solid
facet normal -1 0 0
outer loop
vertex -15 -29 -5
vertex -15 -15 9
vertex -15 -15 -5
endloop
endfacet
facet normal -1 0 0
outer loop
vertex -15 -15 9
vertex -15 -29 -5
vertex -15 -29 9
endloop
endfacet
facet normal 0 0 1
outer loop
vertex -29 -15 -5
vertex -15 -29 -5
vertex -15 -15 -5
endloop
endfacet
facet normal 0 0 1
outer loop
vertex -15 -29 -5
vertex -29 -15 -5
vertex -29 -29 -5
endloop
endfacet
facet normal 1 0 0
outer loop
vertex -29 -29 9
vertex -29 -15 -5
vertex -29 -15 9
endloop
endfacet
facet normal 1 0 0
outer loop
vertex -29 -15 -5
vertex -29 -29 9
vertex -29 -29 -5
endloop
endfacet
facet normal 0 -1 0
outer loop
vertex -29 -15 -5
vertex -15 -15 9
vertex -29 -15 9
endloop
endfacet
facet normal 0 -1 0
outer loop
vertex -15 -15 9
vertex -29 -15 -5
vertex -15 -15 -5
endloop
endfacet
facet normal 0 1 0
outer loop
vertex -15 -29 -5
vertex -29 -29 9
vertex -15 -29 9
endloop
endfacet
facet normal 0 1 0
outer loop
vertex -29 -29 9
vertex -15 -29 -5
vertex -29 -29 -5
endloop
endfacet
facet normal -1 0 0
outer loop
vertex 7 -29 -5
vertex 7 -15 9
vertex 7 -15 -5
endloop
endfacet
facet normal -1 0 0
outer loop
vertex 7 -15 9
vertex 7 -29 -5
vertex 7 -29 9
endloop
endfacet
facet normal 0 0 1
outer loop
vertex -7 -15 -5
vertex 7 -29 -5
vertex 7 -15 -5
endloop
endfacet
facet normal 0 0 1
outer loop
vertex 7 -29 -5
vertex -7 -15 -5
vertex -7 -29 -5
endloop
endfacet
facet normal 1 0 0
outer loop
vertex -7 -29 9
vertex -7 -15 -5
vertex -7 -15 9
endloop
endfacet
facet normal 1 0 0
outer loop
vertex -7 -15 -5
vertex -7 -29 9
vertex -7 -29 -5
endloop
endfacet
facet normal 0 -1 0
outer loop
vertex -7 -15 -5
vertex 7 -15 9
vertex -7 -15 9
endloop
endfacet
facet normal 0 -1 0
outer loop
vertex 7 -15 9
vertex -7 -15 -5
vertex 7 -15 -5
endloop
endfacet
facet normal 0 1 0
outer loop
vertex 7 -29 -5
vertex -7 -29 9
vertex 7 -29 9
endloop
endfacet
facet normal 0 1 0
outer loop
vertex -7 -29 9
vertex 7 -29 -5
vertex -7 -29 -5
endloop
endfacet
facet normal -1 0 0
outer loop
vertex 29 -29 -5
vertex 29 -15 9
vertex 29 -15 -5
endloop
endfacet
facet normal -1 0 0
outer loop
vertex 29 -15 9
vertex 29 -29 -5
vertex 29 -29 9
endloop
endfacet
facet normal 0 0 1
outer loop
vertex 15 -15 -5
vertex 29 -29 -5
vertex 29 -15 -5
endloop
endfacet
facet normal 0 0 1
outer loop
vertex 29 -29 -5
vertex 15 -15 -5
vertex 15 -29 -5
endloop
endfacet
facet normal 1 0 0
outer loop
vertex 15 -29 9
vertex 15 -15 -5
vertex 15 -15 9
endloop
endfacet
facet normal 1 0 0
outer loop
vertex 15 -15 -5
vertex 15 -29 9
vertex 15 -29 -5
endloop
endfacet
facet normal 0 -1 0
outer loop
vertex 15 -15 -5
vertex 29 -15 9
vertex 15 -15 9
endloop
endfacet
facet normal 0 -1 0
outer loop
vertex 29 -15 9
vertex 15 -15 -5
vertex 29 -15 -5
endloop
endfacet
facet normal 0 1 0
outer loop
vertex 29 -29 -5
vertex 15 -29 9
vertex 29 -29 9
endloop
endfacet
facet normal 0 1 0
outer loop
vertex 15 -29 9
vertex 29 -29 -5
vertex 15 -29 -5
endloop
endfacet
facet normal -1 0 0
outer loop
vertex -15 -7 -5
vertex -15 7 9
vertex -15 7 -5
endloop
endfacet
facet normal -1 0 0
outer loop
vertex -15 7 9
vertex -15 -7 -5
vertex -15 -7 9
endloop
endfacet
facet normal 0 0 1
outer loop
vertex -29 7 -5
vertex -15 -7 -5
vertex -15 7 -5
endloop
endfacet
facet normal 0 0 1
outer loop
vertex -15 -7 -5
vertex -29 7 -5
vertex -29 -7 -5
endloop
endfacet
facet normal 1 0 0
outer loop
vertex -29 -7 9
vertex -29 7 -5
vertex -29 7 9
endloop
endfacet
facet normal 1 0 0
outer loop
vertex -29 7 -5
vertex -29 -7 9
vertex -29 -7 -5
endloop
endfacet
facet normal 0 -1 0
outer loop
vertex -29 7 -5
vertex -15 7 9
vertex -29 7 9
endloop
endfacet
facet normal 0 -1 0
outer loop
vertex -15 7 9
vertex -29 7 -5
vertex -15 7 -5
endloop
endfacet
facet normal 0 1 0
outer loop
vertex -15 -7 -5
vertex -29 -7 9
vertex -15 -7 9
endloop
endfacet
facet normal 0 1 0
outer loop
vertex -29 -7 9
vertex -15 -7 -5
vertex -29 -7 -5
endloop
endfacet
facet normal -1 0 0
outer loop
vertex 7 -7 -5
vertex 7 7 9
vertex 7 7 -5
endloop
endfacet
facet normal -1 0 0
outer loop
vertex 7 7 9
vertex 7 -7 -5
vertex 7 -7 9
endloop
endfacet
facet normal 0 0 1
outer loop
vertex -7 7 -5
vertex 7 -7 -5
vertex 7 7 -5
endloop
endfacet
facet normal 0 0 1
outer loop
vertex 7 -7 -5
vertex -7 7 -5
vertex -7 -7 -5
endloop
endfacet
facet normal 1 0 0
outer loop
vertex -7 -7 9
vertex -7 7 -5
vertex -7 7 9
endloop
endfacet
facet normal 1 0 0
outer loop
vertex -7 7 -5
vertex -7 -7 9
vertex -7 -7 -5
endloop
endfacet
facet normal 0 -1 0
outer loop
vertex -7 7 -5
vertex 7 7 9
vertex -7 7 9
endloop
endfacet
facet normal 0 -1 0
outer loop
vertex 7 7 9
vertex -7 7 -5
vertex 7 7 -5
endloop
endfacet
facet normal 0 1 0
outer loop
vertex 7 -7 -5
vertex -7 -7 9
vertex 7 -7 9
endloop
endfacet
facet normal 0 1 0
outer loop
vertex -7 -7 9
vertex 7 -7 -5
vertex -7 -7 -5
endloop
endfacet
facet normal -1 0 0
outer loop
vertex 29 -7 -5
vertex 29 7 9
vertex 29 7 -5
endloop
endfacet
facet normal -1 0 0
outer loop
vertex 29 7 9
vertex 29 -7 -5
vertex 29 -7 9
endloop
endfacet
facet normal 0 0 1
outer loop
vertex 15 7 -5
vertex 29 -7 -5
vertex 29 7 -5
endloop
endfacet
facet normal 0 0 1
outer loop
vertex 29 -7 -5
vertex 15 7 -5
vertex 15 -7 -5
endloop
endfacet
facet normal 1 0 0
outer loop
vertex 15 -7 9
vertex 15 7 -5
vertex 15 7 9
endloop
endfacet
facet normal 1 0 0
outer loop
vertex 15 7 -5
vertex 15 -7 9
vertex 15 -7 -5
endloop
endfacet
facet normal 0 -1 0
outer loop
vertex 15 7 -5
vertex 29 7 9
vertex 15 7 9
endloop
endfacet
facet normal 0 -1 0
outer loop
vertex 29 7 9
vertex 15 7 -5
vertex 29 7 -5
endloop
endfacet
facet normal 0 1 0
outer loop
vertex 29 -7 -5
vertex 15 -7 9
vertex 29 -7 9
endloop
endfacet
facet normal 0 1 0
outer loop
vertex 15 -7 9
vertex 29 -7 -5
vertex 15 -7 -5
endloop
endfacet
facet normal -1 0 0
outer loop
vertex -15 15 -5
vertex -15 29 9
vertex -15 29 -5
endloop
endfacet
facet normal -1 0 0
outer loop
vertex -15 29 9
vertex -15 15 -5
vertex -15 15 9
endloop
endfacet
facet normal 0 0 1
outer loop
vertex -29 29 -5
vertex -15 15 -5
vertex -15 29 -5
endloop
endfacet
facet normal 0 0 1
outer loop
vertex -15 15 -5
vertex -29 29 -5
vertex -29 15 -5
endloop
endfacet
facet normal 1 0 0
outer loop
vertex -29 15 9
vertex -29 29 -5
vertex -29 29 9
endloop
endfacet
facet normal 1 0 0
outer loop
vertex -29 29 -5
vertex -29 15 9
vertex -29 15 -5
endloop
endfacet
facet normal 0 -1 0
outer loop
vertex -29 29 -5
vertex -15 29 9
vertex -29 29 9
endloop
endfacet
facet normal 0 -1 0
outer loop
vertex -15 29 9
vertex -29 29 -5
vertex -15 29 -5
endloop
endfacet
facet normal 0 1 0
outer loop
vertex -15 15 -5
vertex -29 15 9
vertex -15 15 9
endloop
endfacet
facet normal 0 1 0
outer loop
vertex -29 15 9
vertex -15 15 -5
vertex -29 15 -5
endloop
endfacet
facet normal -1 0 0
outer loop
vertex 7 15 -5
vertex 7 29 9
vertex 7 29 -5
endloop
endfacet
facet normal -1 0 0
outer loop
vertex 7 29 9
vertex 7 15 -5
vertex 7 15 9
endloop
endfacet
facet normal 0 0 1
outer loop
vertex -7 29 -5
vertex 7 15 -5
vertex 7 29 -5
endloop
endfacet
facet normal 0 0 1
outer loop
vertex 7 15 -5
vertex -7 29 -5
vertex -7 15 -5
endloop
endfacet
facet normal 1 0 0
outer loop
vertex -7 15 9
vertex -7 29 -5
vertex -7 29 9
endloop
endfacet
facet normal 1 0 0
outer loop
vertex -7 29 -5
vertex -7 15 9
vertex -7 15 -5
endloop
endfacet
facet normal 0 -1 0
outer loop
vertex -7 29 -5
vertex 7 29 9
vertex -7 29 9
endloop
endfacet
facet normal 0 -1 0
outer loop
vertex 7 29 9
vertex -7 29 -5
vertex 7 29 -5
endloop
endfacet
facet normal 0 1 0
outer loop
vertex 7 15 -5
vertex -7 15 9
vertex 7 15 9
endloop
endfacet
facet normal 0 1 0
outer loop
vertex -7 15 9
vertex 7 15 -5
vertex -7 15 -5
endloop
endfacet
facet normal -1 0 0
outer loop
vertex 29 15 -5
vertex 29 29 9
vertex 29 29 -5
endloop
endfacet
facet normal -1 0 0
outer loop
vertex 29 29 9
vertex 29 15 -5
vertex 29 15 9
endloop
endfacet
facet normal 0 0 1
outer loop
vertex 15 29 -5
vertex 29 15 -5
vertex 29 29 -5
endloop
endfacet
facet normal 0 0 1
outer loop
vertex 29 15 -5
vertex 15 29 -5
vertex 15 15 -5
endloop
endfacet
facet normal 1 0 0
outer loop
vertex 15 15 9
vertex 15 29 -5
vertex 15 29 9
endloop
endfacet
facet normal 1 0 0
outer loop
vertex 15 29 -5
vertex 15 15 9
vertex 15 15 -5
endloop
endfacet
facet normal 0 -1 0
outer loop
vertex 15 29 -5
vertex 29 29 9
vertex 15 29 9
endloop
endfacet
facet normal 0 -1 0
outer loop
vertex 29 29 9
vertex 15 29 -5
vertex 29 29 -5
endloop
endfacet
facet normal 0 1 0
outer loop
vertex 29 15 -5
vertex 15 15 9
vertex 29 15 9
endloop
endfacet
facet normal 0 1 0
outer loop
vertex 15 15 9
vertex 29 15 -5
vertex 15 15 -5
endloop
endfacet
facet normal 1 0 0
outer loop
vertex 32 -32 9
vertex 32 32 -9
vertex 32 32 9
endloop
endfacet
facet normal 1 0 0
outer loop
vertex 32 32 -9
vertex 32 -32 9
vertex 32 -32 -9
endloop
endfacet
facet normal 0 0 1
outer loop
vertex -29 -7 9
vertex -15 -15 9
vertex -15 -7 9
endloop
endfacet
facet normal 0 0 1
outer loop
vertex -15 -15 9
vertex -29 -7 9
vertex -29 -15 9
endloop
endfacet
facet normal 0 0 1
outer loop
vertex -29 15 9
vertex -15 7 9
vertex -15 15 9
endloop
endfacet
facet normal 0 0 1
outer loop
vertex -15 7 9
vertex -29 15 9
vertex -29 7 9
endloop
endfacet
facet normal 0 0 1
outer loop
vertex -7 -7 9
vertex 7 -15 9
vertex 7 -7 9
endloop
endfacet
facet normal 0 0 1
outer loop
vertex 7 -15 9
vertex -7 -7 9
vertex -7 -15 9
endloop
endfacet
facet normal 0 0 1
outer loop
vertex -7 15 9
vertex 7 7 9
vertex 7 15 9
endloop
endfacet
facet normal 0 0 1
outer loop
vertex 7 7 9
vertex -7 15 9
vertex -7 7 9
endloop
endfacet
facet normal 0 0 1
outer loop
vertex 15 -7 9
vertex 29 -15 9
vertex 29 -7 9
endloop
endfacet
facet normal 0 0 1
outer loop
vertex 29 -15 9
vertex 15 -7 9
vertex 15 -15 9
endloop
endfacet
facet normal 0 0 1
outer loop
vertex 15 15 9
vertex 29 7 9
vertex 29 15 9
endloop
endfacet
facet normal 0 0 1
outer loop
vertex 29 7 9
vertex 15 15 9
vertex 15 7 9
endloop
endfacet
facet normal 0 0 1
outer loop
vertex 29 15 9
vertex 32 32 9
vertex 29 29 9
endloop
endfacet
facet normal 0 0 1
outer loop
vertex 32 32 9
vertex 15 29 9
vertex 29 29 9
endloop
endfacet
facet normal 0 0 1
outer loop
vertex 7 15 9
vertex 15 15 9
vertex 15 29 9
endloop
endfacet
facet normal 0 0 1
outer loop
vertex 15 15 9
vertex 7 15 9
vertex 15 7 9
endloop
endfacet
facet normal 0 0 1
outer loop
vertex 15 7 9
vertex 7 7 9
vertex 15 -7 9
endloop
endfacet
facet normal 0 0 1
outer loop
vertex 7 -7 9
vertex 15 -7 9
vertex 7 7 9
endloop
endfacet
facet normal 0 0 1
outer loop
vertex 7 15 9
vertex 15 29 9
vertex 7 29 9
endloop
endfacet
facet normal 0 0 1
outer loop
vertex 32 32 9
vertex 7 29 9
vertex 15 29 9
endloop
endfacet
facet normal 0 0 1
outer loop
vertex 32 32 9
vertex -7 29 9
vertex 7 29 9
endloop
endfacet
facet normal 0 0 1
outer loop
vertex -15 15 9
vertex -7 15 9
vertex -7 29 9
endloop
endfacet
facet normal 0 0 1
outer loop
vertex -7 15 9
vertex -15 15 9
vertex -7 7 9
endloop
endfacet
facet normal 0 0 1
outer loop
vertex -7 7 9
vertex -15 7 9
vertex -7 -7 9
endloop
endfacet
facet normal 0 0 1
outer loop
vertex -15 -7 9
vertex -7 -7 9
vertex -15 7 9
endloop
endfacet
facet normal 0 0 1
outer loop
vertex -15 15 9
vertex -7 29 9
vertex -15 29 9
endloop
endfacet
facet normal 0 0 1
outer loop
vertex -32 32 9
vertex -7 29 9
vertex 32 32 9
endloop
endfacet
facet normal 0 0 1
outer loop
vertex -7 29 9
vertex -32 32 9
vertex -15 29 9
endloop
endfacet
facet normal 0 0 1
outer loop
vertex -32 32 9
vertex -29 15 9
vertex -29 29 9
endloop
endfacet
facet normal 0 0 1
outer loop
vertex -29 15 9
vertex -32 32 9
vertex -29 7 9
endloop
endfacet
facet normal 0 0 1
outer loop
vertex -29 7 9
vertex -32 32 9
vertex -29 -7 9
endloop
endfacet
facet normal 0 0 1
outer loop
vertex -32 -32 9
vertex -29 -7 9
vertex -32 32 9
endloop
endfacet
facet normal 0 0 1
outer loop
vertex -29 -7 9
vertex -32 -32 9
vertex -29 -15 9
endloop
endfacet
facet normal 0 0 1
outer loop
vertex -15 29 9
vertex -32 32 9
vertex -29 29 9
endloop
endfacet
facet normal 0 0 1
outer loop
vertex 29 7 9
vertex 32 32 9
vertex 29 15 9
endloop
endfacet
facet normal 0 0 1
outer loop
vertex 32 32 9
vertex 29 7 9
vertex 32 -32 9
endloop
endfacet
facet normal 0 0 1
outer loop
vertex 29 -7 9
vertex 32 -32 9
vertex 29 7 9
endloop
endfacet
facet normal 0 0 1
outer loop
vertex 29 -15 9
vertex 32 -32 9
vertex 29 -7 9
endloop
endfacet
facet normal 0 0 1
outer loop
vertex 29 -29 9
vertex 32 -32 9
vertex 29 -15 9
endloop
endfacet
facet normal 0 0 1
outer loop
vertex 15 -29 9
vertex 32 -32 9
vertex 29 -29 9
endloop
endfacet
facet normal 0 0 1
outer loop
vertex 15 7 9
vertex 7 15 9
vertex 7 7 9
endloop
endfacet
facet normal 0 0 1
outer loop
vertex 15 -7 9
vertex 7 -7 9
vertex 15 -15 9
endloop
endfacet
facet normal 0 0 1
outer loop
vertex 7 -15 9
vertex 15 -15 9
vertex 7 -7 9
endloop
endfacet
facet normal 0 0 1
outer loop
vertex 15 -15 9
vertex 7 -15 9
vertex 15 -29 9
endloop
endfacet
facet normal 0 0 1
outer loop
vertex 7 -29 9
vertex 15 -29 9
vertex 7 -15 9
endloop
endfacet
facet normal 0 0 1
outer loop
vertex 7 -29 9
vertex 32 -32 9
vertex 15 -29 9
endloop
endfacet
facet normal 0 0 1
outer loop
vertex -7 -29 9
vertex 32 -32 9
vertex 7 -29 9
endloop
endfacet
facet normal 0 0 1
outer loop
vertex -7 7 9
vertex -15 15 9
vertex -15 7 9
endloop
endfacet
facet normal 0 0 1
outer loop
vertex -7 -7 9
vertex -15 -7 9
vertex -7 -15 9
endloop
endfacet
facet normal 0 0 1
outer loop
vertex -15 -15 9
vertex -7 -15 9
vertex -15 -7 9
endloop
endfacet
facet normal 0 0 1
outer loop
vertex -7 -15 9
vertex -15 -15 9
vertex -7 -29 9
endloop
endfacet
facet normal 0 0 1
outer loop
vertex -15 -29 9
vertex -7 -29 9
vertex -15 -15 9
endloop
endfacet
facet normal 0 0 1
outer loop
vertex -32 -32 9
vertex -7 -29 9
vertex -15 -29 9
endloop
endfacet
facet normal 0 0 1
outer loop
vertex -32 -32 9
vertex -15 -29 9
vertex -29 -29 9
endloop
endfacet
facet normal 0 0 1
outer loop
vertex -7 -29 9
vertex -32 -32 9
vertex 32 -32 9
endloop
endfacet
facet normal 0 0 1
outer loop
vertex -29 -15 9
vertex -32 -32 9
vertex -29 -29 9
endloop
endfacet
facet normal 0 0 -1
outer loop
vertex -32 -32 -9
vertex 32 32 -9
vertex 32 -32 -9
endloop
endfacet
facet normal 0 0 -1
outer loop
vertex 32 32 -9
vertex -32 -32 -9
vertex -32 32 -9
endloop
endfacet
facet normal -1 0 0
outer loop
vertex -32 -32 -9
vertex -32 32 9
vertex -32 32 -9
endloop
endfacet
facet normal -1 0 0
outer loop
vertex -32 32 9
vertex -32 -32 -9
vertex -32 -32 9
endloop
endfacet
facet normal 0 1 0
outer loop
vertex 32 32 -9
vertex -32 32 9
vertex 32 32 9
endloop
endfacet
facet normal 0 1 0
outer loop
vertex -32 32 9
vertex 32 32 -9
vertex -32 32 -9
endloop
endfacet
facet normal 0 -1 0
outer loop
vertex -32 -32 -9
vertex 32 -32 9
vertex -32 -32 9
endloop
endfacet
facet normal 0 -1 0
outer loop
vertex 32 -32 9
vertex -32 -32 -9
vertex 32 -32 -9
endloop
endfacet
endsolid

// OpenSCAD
$fn = 32;

// ----------------------------------------------------------------------
// Pocket plate 64 x 64 x 18
// 3 x 3 pockets 14 mm square, 14 mm deep
// ----------------------------------------------------------------------

// --- parameters (mm) ---
thickness = 18;  // plate thickness
floor_t = 4;     // material left under each pocket
pocket = 14;     // pocket side length
pitch_x = 22;    // pocket pitch along X
pitch_y = 22;    // pocket pitch along Y
cols = 3;        // pockets per row
rows = 3;        // rows of pockets

// --- derived feature positions (mm) ---
depth = thickness - floor_t;        // = 14   pocket depth, down to the floor
span_x = (cols - 1) * pitch_x;      // = 44   distance between outer pockets
span_y = (rows - 1) * pitch_y;      // = 44   distance between outer pocket rows
origin_x = -span_x / 2;             // = -22   X of the first pocket
origin_y = -span_y / 2;             // = -22   Y of the first pocket
plate = [span_x + pocket + 6, span_y + pocket + 6, thickness];  // = [64, 64, 18]   overall size: pockets plus 3 mm of wall on each side
feature_centers = [
  [origin_x + 0 * pitch_x, origin_y + 0 * pitch_y],
  [origin_x + 1 * pitch_x, origin_y + 0 * pitch_y],
  [origin_x + 2 * pitch_x, origin_y + 0 * pitch_y],
  [origin_x + 0 * pitch_x, origin_y + 1 * pitch_y],
  [origin_x + 1 * pitch_x, origin_y + 1 * pitch_y],
  [origin_x + 2 * pitch_x, origin_y + 1 * pitch_y],
  [origin_x + 0 * pitch_x, origin_y + 2 * pitch_y],
  [origin_x + 1 * pitch_x, origin_y + 2 * pitch_y],
  [origin_x + 2 * pitch_x, origin_y + 2 * pitch_y]
];   // pocket centres, used verbatim by the cutter loop

// plate outline, then one pocket per centre in feature_centers
difference() {
  cube(plate, center = true);
  for (centre = feature_centers)
    translate([centre[0] - pocket / 2, centre[1] - pocket / 2, plate[2] / 2 - depth])
      cube([pocket, pocket, depth + 1]);  // centred on the declared pocket centre
}
